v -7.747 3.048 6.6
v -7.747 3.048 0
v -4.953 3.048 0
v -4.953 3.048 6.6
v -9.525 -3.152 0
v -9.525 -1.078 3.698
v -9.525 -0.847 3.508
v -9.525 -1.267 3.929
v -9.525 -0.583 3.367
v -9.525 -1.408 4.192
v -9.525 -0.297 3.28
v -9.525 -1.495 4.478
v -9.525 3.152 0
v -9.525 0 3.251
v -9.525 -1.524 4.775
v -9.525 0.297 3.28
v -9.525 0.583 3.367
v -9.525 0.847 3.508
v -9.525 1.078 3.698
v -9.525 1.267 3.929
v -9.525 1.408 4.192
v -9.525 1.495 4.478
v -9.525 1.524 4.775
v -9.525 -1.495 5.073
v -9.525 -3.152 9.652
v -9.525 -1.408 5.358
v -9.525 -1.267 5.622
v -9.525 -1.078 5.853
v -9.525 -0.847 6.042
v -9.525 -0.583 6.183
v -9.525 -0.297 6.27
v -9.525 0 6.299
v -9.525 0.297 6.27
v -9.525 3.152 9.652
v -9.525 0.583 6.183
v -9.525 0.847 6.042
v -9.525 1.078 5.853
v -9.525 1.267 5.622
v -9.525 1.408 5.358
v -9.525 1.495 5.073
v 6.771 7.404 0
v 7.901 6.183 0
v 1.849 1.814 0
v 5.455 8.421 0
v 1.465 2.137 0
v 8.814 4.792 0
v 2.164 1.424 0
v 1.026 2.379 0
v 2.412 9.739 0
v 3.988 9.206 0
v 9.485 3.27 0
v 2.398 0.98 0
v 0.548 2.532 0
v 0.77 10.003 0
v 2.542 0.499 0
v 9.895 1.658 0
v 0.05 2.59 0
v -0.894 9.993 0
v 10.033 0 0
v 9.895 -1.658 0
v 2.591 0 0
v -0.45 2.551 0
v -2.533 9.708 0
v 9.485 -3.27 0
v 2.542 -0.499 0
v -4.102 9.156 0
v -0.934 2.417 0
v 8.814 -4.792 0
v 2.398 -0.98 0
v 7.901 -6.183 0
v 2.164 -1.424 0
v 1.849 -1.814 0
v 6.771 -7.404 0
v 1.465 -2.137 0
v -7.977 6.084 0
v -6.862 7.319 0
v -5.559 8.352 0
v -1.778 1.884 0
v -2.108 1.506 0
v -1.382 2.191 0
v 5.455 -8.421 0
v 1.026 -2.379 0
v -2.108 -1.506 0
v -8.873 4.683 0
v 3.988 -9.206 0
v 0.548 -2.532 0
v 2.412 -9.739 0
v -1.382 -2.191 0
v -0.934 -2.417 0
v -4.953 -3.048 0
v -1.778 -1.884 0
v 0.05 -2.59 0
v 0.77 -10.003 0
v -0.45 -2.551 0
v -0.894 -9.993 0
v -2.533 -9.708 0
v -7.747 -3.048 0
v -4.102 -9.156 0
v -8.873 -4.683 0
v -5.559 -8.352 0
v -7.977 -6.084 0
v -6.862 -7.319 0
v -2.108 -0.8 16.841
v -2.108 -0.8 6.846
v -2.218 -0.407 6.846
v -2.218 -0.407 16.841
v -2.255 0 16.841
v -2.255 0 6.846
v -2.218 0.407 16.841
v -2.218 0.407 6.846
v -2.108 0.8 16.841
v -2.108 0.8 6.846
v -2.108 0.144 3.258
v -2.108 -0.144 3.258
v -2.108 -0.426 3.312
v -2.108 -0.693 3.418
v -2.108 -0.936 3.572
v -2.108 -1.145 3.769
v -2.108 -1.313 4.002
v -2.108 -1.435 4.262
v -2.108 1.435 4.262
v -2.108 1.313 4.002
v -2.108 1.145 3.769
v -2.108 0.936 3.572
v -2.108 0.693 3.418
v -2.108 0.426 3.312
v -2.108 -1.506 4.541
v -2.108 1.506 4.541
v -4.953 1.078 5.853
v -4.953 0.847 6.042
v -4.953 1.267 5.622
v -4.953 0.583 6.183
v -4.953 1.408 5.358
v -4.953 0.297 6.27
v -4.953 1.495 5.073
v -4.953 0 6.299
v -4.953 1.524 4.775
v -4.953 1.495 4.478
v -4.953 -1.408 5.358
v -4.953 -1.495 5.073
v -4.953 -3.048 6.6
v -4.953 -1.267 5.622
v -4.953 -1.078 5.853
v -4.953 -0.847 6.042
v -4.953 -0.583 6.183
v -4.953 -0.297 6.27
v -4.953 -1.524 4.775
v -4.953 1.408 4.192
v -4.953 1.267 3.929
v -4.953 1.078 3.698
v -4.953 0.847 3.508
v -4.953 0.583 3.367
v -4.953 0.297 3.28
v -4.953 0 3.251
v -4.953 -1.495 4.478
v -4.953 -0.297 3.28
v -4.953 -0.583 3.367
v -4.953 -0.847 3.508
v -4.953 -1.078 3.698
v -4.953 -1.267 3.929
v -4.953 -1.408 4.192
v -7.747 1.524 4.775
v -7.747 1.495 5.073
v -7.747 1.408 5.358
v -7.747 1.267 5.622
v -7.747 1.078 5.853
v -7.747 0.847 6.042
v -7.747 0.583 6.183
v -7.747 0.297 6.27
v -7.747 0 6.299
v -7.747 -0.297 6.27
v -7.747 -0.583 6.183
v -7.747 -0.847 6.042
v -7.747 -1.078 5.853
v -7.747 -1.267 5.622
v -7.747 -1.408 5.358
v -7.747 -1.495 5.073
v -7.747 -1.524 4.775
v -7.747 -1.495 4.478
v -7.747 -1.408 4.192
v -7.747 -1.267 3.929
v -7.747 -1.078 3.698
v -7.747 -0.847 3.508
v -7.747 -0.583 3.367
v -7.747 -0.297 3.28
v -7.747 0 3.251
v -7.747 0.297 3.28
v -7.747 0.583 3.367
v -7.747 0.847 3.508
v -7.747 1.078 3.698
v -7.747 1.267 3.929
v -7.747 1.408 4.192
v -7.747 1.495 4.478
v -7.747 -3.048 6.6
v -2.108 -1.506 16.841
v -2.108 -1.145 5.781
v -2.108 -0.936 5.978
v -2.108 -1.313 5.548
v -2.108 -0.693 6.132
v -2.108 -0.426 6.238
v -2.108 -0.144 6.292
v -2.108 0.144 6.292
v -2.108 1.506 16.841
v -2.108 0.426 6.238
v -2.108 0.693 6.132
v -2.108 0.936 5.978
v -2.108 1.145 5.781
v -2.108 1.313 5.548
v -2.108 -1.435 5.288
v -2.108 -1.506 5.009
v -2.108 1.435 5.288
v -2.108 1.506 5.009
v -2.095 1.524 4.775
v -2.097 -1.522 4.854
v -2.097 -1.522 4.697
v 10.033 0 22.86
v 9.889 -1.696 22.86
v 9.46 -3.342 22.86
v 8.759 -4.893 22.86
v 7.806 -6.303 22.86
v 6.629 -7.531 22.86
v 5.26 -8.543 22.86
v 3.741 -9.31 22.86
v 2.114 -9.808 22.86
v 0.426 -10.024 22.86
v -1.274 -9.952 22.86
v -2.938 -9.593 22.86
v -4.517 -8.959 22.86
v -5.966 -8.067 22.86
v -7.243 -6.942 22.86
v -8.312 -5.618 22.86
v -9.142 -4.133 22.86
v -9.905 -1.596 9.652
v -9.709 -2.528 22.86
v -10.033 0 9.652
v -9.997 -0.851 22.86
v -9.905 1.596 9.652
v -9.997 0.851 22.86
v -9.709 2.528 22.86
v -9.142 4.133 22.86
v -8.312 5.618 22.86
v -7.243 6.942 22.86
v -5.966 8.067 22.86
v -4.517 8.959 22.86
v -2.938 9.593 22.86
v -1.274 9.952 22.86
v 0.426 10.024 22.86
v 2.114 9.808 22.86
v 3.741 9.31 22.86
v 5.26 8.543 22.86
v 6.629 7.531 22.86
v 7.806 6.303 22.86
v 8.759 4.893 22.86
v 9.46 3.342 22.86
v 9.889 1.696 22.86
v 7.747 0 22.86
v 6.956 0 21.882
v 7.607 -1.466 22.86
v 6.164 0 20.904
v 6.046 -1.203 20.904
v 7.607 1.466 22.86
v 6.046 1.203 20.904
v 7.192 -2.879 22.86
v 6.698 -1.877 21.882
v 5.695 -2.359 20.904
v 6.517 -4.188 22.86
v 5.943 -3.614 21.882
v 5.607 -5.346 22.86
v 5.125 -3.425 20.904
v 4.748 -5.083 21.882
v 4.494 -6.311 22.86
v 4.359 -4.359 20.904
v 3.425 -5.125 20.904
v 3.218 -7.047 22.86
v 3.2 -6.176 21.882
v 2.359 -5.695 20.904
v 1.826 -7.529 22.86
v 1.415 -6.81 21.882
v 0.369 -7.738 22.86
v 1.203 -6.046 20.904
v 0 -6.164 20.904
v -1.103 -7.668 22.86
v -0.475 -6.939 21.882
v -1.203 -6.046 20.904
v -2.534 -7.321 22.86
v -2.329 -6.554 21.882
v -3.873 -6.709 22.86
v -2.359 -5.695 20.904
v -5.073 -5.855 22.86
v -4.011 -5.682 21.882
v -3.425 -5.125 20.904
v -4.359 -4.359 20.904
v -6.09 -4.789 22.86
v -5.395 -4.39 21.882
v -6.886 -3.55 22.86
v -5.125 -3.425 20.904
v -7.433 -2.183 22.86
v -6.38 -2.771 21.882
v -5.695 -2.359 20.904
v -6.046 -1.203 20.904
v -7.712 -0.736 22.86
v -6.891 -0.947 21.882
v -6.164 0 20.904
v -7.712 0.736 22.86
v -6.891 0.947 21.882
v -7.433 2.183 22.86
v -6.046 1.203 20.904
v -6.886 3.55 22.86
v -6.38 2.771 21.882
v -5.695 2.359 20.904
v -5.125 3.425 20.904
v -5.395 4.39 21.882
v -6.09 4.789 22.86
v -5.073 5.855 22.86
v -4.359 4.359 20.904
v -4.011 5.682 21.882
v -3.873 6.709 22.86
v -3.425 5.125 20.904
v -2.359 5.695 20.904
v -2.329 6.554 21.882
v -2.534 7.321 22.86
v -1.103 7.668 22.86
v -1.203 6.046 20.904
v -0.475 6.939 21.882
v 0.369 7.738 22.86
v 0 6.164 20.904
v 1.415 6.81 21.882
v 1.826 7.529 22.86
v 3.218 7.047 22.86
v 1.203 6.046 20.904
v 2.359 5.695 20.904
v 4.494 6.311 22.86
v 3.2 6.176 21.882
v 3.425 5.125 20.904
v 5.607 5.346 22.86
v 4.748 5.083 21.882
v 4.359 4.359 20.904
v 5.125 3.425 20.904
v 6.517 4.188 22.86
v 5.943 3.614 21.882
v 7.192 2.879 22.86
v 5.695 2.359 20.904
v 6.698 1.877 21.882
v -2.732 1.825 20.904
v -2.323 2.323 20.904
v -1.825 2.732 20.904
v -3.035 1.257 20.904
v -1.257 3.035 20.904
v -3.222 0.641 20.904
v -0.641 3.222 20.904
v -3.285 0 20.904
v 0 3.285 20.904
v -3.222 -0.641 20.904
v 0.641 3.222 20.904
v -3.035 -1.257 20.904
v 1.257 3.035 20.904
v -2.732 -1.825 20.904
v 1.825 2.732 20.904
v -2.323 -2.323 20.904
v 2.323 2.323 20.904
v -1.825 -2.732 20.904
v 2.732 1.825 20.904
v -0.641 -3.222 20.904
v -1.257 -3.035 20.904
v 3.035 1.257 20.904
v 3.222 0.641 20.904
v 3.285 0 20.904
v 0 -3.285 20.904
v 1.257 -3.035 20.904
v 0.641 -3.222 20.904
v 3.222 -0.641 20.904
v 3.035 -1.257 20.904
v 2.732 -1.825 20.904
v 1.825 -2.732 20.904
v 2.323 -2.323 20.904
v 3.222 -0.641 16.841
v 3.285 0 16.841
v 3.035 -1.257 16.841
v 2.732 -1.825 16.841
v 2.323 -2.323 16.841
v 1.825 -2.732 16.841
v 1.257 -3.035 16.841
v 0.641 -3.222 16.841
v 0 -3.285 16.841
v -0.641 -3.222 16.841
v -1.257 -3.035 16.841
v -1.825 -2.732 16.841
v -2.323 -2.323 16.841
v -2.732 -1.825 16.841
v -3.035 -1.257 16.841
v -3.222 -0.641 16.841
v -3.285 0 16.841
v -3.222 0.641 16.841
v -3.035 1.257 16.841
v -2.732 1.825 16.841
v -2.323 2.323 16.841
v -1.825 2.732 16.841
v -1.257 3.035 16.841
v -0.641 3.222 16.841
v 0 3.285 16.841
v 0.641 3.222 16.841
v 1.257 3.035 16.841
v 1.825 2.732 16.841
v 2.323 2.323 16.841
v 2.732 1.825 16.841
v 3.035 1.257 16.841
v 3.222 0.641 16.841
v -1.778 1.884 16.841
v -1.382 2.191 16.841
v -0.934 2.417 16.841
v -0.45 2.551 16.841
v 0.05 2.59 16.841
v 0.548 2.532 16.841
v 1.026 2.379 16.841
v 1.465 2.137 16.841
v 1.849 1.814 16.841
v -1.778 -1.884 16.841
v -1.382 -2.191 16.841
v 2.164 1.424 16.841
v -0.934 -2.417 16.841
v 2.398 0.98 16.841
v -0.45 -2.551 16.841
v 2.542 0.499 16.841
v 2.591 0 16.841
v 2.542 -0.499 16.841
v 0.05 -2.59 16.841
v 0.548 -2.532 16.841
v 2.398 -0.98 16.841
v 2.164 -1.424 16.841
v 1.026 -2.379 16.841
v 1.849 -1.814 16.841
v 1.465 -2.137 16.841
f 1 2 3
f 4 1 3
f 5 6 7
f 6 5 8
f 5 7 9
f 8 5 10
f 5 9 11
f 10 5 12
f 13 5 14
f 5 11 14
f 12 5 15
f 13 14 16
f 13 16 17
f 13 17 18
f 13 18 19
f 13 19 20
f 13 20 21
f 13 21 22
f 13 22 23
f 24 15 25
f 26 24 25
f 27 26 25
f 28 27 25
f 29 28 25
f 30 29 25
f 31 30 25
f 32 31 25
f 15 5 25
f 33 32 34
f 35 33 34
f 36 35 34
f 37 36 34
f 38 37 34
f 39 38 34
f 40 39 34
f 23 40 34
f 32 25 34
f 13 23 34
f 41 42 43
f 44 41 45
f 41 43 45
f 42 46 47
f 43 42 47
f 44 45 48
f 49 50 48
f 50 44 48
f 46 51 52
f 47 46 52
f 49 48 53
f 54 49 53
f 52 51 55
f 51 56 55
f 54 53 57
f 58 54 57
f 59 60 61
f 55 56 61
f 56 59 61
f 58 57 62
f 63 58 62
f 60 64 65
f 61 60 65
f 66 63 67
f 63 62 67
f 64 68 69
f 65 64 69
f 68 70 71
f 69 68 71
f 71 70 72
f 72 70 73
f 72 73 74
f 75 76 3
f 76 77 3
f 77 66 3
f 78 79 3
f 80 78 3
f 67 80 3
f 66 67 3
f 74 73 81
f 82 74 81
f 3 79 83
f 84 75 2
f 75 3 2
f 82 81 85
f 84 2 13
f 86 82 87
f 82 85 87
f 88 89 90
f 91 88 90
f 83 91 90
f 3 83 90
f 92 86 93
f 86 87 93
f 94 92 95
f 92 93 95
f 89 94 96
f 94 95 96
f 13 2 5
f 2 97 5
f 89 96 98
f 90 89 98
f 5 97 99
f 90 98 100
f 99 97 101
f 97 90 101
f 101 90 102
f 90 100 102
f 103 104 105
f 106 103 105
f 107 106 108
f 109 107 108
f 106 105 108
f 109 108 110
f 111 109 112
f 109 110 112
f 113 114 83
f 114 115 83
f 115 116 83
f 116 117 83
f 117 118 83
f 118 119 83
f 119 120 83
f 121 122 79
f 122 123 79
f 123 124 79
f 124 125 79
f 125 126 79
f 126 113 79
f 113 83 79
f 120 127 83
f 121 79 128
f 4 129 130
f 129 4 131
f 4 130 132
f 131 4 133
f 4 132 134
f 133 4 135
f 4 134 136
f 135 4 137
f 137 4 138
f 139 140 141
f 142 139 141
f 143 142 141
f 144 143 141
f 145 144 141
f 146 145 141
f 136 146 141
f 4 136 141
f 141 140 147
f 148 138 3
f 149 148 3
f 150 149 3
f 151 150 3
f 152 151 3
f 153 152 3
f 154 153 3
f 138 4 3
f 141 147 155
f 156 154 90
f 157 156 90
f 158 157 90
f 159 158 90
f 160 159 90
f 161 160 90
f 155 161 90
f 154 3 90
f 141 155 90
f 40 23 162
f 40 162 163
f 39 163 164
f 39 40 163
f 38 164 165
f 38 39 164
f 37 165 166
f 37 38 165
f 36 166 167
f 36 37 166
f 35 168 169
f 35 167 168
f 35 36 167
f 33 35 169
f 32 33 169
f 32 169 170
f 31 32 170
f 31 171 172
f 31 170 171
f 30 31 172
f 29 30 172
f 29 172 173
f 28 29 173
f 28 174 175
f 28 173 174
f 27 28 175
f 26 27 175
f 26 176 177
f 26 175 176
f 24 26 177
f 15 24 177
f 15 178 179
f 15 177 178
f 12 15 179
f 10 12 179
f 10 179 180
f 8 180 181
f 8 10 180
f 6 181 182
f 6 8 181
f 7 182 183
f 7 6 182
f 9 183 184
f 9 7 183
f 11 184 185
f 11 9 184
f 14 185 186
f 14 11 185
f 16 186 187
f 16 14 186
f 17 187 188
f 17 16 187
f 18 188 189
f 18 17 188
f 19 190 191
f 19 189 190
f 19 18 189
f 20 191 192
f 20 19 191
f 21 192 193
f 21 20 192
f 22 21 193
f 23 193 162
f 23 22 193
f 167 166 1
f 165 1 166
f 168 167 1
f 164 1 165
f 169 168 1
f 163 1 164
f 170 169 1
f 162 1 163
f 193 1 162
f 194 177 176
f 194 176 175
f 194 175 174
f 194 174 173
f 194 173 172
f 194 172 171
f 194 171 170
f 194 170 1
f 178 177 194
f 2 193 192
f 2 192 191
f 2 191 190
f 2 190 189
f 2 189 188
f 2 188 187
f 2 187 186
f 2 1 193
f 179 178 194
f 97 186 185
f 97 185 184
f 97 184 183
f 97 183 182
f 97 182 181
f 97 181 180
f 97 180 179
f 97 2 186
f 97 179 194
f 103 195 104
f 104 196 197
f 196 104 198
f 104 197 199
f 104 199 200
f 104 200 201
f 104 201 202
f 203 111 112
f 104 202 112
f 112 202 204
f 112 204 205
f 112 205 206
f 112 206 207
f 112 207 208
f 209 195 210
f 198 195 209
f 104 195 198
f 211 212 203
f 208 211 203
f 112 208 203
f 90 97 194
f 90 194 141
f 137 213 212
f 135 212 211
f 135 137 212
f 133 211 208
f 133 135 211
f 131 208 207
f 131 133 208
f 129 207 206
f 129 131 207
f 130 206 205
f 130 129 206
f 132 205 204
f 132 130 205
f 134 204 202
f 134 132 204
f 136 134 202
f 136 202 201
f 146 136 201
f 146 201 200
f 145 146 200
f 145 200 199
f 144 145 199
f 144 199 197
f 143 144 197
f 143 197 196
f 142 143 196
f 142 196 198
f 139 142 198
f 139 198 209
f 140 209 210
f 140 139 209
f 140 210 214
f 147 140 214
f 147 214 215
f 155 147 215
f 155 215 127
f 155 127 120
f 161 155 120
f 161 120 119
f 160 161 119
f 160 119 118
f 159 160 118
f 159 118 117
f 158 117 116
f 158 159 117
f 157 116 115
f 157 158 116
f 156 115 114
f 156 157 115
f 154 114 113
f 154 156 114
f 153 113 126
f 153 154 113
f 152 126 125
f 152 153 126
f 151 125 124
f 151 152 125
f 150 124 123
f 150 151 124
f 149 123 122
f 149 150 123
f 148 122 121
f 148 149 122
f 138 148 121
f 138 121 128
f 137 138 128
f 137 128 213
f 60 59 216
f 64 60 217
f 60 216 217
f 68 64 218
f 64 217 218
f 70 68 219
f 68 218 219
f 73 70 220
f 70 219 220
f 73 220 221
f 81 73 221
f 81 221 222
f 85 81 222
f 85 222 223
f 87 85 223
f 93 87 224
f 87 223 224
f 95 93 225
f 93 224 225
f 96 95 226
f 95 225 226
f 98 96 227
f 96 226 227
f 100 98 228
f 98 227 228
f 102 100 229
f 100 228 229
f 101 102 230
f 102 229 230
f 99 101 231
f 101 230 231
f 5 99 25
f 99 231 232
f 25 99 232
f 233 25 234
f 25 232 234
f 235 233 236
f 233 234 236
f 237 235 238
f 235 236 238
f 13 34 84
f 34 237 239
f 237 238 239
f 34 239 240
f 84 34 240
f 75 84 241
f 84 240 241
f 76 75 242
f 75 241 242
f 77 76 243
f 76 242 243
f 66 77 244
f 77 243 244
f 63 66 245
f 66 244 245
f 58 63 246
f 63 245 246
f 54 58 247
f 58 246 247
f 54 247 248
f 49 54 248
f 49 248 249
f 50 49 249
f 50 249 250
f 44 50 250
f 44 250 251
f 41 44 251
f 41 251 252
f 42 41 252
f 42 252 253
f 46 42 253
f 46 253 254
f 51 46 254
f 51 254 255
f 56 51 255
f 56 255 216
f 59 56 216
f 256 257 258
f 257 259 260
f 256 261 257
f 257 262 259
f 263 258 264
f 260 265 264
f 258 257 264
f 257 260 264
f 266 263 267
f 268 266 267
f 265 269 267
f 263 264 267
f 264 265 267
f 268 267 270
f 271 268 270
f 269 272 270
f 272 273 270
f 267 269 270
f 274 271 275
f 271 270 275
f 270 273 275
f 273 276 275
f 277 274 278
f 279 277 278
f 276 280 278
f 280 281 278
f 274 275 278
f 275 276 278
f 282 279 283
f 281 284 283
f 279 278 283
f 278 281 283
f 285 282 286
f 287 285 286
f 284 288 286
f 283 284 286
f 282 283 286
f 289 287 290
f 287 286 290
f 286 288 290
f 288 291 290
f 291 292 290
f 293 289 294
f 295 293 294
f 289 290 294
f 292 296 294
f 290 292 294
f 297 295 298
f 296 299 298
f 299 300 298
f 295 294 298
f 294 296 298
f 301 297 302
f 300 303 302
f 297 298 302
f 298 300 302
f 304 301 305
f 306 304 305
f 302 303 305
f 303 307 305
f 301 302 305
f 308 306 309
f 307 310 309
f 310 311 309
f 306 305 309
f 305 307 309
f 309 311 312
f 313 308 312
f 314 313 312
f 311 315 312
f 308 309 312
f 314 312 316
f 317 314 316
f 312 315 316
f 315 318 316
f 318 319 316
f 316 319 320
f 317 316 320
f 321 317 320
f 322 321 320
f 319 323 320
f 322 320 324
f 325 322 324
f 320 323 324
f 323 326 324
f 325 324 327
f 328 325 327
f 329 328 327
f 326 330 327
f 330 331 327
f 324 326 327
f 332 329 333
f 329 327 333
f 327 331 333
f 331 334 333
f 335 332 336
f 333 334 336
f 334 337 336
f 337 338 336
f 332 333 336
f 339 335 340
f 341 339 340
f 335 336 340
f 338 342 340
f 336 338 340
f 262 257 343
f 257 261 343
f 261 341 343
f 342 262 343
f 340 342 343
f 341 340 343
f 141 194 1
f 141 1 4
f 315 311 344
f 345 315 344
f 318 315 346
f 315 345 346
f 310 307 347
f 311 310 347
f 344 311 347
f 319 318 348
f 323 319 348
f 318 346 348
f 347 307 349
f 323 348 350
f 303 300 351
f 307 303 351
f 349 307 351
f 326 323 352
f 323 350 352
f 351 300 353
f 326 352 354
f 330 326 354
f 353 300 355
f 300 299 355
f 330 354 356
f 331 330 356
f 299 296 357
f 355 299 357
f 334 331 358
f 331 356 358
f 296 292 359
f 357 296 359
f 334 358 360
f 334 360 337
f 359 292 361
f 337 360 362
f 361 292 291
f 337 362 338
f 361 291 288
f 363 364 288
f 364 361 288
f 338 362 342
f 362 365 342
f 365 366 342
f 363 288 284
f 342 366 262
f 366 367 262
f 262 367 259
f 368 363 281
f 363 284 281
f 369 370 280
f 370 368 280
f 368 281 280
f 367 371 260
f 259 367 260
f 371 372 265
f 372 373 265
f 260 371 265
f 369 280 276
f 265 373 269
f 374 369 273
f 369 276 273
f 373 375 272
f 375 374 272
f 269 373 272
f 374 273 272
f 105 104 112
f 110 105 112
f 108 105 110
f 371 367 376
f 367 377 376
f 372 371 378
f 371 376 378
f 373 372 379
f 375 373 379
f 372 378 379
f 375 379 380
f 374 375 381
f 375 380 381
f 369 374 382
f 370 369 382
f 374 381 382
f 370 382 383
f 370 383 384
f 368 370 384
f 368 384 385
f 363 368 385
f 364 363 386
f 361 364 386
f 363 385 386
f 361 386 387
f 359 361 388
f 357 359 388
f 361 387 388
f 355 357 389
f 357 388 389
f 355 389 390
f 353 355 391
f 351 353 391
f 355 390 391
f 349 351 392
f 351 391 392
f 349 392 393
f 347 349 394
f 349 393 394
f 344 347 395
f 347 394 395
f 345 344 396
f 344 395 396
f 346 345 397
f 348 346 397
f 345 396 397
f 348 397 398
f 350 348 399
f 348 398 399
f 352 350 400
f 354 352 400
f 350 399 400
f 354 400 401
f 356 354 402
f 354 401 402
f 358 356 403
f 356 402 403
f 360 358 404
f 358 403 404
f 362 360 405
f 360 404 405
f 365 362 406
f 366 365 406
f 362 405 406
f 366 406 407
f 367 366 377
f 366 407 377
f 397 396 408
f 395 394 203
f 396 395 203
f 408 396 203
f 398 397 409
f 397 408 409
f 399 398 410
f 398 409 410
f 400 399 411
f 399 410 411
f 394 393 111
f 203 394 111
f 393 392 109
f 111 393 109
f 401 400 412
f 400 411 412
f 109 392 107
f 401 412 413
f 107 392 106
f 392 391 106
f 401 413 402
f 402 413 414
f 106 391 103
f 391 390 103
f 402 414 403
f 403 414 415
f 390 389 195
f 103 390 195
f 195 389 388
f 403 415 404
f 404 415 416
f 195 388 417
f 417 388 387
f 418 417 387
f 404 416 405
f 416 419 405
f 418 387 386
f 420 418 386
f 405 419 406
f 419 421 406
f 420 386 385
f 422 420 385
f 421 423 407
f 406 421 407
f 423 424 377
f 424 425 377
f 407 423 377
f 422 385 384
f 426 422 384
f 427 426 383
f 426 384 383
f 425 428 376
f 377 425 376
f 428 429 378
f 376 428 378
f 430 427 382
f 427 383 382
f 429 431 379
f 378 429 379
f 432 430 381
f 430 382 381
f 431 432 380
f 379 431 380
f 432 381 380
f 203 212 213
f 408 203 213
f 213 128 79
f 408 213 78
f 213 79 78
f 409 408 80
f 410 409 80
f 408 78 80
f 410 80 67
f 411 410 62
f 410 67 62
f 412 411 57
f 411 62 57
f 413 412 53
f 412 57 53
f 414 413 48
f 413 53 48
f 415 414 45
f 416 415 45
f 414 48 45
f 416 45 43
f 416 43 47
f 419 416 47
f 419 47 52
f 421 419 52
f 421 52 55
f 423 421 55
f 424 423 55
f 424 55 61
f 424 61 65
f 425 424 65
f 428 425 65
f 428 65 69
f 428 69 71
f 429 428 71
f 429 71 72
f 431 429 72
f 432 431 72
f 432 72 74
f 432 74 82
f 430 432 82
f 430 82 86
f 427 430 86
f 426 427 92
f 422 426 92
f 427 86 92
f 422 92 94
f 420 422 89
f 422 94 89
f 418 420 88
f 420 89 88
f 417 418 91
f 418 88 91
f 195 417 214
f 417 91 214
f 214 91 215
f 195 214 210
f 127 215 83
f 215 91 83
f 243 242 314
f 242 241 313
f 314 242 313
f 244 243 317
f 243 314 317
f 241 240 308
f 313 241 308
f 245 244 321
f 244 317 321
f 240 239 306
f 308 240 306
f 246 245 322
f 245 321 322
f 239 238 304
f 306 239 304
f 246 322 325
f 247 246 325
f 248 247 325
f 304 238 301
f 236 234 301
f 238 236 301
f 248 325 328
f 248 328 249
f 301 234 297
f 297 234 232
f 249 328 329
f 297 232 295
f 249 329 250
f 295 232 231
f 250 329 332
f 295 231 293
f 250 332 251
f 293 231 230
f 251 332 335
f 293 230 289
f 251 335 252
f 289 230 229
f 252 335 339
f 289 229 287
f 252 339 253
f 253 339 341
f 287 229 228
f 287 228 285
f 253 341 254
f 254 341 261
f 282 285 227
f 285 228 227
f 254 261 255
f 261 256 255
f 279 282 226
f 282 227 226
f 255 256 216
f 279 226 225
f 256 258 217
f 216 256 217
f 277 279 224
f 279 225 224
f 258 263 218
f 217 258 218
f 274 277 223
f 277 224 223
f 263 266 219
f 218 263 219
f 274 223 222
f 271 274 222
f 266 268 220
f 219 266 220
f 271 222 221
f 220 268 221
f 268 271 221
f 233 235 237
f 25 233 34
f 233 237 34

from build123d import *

# Parameters (mm, degrees)
F3_DEPTH  = 22.861
F5_W      = 10.16
F5_H      = 9.652
F6_DEPTH  = 0.635
F7_R      = 1.524
F8_DEPTH  = 10.16
F9_W      = 2.794
F9_H      = 6.096
F10_DEPTH = 6.6


with BuildPart() as f1:
    # F0 (on Front) → F1 (revolve)
    with BuildSketch(Plane.XZ):
        Polygon((0, 6.846469), (0, 0), (10.033, 0), (10.033, 22.86), (7.747, 22.86), (6.164025, 20.9042), (3.285246, 20.9042), (3.285246, 16.840607), (2.254922, 16.840607), (2.254922, 6.846469), (2.048858, 6.846469), align=None)
    revolve(axis=Axis((0, 0, 8.086767), (0, 0, -1)))

    # F2 (on face) → F3 (cut, through all)
    with BuildSketch(Plane(origin=(0, 0, 0), x_dir=(1, 0, 0), z_dir=(0, 0, -1))):
        with BuildLine():
            ThreePointArc((-2.1082, -1.505901), (2.5908, 0), (-2.1082, 1.505901))
            Line((-2.1082, 1.505901), (-2.1082, -1.505901))
        make_face()
    extrude(amount=-F3_DEPTH, mode=Mode.SUBTRACT)

    # F5 (on offset) → F6 (cut)
    with BuildSketch(Plane.YZ.offset(-10.16)):
        with Locations((0, 4.826)):
            Rectangle(F5_W, F5_H)
    extrude(amount=F6_DEPTH, mode=Mode.SUBTRACT)

    # F7 (on offset) → F8 (cut, through all)
    with BuildSketch(Plane.YZ.offset(-10.16)):
        with Locations((0, 4.7752)):
            Circle(F7_R)
    extrude(amount=F8_DEPTH, mode=Mode.SUBTRACT)

    # F9 (on face) → F10 (cut)
    with BuildSketch(Plane(origin=(0, 0, 0), x_dir=(1, 0, 0), z_dir=(0, 0, -1))):
        with Locations((-6.35, 0)):
            Rectangle(F9_W, F9_H)
    extrude(amount=-F10_DEPTH, mode=Mode.SUBTRACT)


solid = f1.part
